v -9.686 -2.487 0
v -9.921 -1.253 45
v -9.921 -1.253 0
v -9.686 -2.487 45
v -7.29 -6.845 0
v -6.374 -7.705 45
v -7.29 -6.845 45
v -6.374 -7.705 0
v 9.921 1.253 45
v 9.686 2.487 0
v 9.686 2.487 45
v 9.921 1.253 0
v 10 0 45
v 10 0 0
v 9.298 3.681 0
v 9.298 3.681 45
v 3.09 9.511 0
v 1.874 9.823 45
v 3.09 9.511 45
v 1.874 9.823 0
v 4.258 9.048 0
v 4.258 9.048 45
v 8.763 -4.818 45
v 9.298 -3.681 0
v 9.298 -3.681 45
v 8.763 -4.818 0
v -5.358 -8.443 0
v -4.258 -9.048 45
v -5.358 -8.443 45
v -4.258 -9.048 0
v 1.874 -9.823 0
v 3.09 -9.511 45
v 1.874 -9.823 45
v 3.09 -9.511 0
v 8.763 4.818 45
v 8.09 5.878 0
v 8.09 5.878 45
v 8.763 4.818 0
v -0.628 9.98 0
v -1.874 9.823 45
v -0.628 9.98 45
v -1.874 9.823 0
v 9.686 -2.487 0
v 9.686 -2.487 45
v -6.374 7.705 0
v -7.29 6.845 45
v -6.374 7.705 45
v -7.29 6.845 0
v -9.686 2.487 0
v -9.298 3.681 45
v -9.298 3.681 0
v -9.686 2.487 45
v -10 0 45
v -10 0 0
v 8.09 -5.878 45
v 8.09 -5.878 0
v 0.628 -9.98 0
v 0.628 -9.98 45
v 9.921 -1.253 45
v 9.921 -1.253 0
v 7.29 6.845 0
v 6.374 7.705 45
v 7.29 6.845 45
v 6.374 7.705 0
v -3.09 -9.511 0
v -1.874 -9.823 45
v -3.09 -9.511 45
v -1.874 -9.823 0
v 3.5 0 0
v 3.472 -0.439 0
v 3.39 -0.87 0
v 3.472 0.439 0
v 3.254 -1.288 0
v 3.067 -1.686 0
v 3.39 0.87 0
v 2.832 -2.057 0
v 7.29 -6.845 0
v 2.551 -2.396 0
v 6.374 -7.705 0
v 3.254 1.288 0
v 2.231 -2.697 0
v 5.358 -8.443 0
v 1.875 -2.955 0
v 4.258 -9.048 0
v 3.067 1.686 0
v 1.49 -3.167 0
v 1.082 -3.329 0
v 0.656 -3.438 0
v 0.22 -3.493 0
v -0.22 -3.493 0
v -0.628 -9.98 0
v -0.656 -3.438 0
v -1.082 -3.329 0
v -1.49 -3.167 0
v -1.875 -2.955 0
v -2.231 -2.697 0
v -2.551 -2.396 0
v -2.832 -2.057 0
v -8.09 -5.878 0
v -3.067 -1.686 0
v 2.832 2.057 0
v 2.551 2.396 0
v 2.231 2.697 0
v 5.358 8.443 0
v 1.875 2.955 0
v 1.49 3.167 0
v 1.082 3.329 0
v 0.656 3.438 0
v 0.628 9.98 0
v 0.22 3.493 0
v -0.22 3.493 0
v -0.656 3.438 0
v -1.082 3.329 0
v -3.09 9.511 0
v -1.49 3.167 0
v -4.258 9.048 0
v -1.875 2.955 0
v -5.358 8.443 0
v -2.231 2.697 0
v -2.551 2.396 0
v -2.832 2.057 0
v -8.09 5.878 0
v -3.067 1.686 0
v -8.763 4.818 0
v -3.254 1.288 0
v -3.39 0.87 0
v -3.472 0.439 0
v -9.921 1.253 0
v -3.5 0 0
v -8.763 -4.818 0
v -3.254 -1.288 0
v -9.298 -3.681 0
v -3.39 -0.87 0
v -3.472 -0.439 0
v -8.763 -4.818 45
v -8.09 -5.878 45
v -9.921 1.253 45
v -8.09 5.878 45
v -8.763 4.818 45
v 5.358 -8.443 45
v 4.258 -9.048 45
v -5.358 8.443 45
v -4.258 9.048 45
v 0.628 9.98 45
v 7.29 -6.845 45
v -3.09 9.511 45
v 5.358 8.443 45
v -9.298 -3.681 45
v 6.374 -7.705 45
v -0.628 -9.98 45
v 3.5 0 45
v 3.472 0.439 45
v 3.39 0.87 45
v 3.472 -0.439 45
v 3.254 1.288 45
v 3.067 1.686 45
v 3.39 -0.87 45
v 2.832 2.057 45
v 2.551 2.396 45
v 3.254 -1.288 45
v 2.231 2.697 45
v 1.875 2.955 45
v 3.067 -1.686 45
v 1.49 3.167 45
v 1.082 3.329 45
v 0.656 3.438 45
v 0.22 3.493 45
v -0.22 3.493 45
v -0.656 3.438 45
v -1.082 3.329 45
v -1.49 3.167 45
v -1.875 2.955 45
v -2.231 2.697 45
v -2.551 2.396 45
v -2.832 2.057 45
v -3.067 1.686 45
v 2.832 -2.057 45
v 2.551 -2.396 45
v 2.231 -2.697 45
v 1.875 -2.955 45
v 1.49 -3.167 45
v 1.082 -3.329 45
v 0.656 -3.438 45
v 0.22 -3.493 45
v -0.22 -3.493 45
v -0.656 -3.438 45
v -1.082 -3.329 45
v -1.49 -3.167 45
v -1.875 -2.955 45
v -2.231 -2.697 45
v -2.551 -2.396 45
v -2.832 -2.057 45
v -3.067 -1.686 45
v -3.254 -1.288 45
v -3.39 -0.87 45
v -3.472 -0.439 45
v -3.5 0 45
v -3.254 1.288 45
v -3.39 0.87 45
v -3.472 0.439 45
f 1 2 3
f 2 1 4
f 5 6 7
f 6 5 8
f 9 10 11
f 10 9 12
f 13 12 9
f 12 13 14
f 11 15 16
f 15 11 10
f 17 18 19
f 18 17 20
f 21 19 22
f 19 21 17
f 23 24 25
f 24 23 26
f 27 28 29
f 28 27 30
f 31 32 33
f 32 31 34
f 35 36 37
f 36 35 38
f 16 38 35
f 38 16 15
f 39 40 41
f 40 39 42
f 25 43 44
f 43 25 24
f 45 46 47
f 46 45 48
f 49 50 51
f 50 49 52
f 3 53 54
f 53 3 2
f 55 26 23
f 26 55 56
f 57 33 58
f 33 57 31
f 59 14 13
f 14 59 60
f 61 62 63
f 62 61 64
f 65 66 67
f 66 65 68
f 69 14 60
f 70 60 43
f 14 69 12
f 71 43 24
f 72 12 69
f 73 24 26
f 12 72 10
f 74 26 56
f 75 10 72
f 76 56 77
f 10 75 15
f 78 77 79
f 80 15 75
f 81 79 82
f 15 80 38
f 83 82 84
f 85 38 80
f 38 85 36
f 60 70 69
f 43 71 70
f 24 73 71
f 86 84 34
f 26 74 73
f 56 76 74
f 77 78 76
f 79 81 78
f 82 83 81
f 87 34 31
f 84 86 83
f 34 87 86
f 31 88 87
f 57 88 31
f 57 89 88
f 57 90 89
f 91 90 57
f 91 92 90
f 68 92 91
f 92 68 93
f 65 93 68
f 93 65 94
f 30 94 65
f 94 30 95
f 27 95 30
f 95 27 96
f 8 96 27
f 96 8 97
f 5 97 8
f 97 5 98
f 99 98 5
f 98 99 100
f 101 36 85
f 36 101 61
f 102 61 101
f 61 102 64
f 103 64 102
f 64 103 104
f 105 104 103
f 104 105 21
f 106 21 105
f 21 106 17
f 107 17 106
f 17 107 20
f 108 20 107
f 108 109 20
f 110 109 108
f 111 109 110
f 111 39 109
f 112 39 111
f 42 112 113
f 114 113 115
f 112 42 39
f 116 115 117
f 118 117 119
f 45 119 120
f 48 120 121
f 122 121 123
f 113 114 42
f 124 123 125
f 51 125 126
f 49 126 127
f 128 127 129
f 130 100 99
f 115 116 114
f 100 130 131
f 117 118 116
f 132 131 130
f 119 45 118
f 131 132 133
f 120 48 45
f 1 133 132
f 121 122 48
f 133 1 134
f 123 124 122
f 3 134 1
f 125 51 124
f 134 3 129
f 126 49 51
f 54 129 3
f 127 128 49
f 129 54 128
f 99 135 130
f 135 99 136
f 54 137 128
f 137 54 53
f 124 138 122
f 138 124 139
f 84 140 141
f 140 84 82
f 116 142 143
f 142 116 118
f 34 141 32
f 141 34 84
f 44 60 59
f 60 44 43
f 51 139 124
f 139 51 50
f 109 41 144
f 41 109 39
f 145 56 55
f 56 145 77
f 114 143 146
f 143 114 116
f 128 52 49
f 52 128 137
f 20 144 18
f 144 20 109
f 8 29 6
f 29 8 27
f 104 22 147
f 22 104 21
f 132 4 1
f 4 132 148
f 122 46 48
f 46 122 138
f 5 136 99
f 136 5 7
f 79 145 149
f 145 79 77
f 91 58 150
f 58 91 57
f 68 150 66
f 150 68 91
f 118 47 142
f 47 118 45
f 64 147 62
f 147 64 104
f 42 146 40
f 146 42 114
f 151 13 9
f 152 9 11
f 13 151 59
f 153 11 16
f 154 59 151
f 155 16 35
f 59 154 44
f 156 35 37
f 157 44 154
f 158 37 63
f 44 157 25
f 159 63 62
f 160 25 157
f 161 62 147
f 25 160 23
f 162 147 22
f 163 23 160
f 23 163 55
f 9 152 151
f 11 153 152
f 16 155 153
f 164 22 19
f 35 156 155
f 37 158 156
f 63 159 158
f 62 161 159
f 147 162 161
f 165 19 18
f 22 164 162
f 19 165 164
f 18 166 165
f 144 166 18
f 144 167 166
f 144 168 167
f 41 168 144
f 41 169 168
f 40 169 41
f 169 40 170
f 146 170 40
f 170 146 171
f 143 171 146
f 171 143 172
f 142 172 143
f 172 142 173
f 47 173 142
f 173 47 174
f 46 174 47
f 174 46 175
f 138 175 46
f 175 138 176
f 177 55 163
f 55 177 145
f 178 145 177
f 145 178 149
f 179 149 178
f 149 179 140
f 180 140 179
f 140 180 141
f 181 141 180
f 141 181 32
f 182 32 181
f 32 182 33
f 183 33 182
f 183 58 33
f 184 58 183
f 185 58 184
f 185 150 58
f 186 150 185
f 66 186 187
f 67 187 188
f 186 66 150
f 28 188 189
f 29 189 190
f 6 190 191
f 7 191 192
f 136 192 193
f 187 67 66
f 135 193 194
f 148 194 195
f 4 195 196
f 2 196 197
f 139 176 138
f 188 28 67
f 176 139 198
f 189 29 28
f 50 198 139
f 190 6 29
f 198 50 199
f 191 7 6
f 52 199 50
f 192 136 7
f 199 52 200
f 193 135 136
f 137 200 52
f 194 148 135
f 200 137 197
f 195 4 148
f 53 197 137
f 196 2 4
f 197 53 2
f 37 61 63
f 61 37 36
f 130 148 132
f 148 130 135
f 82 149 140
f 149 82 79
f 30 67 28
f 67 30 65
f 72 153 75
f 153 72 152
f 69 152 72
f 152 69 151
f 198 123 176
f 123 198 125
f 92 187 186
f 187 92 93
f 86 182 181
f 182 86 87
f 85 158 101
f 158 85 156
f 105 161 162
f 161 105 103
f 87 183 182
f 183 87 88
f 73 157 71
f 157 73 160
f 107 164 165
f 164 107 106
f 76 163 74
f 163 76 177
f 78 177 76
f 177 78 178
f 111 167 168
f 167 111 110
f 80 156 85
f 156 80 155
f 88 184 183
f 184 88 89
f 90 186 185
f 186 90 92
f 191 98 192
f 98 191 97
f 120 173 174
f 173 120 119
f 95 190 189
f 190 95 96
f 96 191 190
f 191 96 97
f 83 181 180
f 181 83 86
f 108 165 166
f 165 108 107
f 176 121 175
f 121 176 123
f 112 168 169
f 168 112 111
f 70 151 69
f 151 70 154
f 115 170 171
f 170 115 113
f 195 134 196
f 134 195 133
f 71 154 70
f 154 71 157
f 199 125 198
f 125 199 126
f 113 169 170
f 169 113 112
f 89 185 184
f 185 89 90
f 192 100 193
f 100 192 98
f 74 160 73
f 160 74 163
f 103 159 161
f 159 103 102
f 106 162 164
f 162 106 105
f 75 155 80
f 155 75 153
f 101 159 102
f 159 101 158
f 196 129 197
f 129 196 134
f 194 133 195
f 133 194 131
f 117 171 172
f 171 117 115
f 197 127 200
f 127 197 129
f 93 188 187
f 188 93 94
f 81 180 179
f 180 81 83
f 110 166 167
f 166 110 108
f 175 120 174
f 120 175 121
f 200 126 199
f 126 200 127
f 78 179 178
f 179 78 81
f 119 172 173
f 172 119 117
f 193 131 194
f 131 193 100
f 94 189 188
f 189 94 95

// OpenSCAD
// file: global.scad
// material
material_width = 5;

// rendering parameters
$fn=50;

// box measures
box_x = 100;
box_y = 75;
box_z = 45;

// display measures
display_x = 80;
display_y = 40;

// screw hole measures
screw_extension_radius = 2*material_width;
screw_hole_radius = 3.5;

// derivative measures
total_x = box_x + 2*screw_extension_radius;
// main file
include <global.scad>;

module screw_hole()
{
    // drill a hole for the screw
    cylinder(
        h = box_z,
        r = screw_hole_radius,
        center = false
        );
}

module screw_extension()
{
    // make a cylinder
    cylinder(
        h = box_z,
        r = screw_extension_radius,
        center = false
        );
}

// the drill hole must be separate
// in order to allow other modules
// to also cut away from their
// corresponding shapes
difference()
{
    screw_extension();
    screw_hole();
}
